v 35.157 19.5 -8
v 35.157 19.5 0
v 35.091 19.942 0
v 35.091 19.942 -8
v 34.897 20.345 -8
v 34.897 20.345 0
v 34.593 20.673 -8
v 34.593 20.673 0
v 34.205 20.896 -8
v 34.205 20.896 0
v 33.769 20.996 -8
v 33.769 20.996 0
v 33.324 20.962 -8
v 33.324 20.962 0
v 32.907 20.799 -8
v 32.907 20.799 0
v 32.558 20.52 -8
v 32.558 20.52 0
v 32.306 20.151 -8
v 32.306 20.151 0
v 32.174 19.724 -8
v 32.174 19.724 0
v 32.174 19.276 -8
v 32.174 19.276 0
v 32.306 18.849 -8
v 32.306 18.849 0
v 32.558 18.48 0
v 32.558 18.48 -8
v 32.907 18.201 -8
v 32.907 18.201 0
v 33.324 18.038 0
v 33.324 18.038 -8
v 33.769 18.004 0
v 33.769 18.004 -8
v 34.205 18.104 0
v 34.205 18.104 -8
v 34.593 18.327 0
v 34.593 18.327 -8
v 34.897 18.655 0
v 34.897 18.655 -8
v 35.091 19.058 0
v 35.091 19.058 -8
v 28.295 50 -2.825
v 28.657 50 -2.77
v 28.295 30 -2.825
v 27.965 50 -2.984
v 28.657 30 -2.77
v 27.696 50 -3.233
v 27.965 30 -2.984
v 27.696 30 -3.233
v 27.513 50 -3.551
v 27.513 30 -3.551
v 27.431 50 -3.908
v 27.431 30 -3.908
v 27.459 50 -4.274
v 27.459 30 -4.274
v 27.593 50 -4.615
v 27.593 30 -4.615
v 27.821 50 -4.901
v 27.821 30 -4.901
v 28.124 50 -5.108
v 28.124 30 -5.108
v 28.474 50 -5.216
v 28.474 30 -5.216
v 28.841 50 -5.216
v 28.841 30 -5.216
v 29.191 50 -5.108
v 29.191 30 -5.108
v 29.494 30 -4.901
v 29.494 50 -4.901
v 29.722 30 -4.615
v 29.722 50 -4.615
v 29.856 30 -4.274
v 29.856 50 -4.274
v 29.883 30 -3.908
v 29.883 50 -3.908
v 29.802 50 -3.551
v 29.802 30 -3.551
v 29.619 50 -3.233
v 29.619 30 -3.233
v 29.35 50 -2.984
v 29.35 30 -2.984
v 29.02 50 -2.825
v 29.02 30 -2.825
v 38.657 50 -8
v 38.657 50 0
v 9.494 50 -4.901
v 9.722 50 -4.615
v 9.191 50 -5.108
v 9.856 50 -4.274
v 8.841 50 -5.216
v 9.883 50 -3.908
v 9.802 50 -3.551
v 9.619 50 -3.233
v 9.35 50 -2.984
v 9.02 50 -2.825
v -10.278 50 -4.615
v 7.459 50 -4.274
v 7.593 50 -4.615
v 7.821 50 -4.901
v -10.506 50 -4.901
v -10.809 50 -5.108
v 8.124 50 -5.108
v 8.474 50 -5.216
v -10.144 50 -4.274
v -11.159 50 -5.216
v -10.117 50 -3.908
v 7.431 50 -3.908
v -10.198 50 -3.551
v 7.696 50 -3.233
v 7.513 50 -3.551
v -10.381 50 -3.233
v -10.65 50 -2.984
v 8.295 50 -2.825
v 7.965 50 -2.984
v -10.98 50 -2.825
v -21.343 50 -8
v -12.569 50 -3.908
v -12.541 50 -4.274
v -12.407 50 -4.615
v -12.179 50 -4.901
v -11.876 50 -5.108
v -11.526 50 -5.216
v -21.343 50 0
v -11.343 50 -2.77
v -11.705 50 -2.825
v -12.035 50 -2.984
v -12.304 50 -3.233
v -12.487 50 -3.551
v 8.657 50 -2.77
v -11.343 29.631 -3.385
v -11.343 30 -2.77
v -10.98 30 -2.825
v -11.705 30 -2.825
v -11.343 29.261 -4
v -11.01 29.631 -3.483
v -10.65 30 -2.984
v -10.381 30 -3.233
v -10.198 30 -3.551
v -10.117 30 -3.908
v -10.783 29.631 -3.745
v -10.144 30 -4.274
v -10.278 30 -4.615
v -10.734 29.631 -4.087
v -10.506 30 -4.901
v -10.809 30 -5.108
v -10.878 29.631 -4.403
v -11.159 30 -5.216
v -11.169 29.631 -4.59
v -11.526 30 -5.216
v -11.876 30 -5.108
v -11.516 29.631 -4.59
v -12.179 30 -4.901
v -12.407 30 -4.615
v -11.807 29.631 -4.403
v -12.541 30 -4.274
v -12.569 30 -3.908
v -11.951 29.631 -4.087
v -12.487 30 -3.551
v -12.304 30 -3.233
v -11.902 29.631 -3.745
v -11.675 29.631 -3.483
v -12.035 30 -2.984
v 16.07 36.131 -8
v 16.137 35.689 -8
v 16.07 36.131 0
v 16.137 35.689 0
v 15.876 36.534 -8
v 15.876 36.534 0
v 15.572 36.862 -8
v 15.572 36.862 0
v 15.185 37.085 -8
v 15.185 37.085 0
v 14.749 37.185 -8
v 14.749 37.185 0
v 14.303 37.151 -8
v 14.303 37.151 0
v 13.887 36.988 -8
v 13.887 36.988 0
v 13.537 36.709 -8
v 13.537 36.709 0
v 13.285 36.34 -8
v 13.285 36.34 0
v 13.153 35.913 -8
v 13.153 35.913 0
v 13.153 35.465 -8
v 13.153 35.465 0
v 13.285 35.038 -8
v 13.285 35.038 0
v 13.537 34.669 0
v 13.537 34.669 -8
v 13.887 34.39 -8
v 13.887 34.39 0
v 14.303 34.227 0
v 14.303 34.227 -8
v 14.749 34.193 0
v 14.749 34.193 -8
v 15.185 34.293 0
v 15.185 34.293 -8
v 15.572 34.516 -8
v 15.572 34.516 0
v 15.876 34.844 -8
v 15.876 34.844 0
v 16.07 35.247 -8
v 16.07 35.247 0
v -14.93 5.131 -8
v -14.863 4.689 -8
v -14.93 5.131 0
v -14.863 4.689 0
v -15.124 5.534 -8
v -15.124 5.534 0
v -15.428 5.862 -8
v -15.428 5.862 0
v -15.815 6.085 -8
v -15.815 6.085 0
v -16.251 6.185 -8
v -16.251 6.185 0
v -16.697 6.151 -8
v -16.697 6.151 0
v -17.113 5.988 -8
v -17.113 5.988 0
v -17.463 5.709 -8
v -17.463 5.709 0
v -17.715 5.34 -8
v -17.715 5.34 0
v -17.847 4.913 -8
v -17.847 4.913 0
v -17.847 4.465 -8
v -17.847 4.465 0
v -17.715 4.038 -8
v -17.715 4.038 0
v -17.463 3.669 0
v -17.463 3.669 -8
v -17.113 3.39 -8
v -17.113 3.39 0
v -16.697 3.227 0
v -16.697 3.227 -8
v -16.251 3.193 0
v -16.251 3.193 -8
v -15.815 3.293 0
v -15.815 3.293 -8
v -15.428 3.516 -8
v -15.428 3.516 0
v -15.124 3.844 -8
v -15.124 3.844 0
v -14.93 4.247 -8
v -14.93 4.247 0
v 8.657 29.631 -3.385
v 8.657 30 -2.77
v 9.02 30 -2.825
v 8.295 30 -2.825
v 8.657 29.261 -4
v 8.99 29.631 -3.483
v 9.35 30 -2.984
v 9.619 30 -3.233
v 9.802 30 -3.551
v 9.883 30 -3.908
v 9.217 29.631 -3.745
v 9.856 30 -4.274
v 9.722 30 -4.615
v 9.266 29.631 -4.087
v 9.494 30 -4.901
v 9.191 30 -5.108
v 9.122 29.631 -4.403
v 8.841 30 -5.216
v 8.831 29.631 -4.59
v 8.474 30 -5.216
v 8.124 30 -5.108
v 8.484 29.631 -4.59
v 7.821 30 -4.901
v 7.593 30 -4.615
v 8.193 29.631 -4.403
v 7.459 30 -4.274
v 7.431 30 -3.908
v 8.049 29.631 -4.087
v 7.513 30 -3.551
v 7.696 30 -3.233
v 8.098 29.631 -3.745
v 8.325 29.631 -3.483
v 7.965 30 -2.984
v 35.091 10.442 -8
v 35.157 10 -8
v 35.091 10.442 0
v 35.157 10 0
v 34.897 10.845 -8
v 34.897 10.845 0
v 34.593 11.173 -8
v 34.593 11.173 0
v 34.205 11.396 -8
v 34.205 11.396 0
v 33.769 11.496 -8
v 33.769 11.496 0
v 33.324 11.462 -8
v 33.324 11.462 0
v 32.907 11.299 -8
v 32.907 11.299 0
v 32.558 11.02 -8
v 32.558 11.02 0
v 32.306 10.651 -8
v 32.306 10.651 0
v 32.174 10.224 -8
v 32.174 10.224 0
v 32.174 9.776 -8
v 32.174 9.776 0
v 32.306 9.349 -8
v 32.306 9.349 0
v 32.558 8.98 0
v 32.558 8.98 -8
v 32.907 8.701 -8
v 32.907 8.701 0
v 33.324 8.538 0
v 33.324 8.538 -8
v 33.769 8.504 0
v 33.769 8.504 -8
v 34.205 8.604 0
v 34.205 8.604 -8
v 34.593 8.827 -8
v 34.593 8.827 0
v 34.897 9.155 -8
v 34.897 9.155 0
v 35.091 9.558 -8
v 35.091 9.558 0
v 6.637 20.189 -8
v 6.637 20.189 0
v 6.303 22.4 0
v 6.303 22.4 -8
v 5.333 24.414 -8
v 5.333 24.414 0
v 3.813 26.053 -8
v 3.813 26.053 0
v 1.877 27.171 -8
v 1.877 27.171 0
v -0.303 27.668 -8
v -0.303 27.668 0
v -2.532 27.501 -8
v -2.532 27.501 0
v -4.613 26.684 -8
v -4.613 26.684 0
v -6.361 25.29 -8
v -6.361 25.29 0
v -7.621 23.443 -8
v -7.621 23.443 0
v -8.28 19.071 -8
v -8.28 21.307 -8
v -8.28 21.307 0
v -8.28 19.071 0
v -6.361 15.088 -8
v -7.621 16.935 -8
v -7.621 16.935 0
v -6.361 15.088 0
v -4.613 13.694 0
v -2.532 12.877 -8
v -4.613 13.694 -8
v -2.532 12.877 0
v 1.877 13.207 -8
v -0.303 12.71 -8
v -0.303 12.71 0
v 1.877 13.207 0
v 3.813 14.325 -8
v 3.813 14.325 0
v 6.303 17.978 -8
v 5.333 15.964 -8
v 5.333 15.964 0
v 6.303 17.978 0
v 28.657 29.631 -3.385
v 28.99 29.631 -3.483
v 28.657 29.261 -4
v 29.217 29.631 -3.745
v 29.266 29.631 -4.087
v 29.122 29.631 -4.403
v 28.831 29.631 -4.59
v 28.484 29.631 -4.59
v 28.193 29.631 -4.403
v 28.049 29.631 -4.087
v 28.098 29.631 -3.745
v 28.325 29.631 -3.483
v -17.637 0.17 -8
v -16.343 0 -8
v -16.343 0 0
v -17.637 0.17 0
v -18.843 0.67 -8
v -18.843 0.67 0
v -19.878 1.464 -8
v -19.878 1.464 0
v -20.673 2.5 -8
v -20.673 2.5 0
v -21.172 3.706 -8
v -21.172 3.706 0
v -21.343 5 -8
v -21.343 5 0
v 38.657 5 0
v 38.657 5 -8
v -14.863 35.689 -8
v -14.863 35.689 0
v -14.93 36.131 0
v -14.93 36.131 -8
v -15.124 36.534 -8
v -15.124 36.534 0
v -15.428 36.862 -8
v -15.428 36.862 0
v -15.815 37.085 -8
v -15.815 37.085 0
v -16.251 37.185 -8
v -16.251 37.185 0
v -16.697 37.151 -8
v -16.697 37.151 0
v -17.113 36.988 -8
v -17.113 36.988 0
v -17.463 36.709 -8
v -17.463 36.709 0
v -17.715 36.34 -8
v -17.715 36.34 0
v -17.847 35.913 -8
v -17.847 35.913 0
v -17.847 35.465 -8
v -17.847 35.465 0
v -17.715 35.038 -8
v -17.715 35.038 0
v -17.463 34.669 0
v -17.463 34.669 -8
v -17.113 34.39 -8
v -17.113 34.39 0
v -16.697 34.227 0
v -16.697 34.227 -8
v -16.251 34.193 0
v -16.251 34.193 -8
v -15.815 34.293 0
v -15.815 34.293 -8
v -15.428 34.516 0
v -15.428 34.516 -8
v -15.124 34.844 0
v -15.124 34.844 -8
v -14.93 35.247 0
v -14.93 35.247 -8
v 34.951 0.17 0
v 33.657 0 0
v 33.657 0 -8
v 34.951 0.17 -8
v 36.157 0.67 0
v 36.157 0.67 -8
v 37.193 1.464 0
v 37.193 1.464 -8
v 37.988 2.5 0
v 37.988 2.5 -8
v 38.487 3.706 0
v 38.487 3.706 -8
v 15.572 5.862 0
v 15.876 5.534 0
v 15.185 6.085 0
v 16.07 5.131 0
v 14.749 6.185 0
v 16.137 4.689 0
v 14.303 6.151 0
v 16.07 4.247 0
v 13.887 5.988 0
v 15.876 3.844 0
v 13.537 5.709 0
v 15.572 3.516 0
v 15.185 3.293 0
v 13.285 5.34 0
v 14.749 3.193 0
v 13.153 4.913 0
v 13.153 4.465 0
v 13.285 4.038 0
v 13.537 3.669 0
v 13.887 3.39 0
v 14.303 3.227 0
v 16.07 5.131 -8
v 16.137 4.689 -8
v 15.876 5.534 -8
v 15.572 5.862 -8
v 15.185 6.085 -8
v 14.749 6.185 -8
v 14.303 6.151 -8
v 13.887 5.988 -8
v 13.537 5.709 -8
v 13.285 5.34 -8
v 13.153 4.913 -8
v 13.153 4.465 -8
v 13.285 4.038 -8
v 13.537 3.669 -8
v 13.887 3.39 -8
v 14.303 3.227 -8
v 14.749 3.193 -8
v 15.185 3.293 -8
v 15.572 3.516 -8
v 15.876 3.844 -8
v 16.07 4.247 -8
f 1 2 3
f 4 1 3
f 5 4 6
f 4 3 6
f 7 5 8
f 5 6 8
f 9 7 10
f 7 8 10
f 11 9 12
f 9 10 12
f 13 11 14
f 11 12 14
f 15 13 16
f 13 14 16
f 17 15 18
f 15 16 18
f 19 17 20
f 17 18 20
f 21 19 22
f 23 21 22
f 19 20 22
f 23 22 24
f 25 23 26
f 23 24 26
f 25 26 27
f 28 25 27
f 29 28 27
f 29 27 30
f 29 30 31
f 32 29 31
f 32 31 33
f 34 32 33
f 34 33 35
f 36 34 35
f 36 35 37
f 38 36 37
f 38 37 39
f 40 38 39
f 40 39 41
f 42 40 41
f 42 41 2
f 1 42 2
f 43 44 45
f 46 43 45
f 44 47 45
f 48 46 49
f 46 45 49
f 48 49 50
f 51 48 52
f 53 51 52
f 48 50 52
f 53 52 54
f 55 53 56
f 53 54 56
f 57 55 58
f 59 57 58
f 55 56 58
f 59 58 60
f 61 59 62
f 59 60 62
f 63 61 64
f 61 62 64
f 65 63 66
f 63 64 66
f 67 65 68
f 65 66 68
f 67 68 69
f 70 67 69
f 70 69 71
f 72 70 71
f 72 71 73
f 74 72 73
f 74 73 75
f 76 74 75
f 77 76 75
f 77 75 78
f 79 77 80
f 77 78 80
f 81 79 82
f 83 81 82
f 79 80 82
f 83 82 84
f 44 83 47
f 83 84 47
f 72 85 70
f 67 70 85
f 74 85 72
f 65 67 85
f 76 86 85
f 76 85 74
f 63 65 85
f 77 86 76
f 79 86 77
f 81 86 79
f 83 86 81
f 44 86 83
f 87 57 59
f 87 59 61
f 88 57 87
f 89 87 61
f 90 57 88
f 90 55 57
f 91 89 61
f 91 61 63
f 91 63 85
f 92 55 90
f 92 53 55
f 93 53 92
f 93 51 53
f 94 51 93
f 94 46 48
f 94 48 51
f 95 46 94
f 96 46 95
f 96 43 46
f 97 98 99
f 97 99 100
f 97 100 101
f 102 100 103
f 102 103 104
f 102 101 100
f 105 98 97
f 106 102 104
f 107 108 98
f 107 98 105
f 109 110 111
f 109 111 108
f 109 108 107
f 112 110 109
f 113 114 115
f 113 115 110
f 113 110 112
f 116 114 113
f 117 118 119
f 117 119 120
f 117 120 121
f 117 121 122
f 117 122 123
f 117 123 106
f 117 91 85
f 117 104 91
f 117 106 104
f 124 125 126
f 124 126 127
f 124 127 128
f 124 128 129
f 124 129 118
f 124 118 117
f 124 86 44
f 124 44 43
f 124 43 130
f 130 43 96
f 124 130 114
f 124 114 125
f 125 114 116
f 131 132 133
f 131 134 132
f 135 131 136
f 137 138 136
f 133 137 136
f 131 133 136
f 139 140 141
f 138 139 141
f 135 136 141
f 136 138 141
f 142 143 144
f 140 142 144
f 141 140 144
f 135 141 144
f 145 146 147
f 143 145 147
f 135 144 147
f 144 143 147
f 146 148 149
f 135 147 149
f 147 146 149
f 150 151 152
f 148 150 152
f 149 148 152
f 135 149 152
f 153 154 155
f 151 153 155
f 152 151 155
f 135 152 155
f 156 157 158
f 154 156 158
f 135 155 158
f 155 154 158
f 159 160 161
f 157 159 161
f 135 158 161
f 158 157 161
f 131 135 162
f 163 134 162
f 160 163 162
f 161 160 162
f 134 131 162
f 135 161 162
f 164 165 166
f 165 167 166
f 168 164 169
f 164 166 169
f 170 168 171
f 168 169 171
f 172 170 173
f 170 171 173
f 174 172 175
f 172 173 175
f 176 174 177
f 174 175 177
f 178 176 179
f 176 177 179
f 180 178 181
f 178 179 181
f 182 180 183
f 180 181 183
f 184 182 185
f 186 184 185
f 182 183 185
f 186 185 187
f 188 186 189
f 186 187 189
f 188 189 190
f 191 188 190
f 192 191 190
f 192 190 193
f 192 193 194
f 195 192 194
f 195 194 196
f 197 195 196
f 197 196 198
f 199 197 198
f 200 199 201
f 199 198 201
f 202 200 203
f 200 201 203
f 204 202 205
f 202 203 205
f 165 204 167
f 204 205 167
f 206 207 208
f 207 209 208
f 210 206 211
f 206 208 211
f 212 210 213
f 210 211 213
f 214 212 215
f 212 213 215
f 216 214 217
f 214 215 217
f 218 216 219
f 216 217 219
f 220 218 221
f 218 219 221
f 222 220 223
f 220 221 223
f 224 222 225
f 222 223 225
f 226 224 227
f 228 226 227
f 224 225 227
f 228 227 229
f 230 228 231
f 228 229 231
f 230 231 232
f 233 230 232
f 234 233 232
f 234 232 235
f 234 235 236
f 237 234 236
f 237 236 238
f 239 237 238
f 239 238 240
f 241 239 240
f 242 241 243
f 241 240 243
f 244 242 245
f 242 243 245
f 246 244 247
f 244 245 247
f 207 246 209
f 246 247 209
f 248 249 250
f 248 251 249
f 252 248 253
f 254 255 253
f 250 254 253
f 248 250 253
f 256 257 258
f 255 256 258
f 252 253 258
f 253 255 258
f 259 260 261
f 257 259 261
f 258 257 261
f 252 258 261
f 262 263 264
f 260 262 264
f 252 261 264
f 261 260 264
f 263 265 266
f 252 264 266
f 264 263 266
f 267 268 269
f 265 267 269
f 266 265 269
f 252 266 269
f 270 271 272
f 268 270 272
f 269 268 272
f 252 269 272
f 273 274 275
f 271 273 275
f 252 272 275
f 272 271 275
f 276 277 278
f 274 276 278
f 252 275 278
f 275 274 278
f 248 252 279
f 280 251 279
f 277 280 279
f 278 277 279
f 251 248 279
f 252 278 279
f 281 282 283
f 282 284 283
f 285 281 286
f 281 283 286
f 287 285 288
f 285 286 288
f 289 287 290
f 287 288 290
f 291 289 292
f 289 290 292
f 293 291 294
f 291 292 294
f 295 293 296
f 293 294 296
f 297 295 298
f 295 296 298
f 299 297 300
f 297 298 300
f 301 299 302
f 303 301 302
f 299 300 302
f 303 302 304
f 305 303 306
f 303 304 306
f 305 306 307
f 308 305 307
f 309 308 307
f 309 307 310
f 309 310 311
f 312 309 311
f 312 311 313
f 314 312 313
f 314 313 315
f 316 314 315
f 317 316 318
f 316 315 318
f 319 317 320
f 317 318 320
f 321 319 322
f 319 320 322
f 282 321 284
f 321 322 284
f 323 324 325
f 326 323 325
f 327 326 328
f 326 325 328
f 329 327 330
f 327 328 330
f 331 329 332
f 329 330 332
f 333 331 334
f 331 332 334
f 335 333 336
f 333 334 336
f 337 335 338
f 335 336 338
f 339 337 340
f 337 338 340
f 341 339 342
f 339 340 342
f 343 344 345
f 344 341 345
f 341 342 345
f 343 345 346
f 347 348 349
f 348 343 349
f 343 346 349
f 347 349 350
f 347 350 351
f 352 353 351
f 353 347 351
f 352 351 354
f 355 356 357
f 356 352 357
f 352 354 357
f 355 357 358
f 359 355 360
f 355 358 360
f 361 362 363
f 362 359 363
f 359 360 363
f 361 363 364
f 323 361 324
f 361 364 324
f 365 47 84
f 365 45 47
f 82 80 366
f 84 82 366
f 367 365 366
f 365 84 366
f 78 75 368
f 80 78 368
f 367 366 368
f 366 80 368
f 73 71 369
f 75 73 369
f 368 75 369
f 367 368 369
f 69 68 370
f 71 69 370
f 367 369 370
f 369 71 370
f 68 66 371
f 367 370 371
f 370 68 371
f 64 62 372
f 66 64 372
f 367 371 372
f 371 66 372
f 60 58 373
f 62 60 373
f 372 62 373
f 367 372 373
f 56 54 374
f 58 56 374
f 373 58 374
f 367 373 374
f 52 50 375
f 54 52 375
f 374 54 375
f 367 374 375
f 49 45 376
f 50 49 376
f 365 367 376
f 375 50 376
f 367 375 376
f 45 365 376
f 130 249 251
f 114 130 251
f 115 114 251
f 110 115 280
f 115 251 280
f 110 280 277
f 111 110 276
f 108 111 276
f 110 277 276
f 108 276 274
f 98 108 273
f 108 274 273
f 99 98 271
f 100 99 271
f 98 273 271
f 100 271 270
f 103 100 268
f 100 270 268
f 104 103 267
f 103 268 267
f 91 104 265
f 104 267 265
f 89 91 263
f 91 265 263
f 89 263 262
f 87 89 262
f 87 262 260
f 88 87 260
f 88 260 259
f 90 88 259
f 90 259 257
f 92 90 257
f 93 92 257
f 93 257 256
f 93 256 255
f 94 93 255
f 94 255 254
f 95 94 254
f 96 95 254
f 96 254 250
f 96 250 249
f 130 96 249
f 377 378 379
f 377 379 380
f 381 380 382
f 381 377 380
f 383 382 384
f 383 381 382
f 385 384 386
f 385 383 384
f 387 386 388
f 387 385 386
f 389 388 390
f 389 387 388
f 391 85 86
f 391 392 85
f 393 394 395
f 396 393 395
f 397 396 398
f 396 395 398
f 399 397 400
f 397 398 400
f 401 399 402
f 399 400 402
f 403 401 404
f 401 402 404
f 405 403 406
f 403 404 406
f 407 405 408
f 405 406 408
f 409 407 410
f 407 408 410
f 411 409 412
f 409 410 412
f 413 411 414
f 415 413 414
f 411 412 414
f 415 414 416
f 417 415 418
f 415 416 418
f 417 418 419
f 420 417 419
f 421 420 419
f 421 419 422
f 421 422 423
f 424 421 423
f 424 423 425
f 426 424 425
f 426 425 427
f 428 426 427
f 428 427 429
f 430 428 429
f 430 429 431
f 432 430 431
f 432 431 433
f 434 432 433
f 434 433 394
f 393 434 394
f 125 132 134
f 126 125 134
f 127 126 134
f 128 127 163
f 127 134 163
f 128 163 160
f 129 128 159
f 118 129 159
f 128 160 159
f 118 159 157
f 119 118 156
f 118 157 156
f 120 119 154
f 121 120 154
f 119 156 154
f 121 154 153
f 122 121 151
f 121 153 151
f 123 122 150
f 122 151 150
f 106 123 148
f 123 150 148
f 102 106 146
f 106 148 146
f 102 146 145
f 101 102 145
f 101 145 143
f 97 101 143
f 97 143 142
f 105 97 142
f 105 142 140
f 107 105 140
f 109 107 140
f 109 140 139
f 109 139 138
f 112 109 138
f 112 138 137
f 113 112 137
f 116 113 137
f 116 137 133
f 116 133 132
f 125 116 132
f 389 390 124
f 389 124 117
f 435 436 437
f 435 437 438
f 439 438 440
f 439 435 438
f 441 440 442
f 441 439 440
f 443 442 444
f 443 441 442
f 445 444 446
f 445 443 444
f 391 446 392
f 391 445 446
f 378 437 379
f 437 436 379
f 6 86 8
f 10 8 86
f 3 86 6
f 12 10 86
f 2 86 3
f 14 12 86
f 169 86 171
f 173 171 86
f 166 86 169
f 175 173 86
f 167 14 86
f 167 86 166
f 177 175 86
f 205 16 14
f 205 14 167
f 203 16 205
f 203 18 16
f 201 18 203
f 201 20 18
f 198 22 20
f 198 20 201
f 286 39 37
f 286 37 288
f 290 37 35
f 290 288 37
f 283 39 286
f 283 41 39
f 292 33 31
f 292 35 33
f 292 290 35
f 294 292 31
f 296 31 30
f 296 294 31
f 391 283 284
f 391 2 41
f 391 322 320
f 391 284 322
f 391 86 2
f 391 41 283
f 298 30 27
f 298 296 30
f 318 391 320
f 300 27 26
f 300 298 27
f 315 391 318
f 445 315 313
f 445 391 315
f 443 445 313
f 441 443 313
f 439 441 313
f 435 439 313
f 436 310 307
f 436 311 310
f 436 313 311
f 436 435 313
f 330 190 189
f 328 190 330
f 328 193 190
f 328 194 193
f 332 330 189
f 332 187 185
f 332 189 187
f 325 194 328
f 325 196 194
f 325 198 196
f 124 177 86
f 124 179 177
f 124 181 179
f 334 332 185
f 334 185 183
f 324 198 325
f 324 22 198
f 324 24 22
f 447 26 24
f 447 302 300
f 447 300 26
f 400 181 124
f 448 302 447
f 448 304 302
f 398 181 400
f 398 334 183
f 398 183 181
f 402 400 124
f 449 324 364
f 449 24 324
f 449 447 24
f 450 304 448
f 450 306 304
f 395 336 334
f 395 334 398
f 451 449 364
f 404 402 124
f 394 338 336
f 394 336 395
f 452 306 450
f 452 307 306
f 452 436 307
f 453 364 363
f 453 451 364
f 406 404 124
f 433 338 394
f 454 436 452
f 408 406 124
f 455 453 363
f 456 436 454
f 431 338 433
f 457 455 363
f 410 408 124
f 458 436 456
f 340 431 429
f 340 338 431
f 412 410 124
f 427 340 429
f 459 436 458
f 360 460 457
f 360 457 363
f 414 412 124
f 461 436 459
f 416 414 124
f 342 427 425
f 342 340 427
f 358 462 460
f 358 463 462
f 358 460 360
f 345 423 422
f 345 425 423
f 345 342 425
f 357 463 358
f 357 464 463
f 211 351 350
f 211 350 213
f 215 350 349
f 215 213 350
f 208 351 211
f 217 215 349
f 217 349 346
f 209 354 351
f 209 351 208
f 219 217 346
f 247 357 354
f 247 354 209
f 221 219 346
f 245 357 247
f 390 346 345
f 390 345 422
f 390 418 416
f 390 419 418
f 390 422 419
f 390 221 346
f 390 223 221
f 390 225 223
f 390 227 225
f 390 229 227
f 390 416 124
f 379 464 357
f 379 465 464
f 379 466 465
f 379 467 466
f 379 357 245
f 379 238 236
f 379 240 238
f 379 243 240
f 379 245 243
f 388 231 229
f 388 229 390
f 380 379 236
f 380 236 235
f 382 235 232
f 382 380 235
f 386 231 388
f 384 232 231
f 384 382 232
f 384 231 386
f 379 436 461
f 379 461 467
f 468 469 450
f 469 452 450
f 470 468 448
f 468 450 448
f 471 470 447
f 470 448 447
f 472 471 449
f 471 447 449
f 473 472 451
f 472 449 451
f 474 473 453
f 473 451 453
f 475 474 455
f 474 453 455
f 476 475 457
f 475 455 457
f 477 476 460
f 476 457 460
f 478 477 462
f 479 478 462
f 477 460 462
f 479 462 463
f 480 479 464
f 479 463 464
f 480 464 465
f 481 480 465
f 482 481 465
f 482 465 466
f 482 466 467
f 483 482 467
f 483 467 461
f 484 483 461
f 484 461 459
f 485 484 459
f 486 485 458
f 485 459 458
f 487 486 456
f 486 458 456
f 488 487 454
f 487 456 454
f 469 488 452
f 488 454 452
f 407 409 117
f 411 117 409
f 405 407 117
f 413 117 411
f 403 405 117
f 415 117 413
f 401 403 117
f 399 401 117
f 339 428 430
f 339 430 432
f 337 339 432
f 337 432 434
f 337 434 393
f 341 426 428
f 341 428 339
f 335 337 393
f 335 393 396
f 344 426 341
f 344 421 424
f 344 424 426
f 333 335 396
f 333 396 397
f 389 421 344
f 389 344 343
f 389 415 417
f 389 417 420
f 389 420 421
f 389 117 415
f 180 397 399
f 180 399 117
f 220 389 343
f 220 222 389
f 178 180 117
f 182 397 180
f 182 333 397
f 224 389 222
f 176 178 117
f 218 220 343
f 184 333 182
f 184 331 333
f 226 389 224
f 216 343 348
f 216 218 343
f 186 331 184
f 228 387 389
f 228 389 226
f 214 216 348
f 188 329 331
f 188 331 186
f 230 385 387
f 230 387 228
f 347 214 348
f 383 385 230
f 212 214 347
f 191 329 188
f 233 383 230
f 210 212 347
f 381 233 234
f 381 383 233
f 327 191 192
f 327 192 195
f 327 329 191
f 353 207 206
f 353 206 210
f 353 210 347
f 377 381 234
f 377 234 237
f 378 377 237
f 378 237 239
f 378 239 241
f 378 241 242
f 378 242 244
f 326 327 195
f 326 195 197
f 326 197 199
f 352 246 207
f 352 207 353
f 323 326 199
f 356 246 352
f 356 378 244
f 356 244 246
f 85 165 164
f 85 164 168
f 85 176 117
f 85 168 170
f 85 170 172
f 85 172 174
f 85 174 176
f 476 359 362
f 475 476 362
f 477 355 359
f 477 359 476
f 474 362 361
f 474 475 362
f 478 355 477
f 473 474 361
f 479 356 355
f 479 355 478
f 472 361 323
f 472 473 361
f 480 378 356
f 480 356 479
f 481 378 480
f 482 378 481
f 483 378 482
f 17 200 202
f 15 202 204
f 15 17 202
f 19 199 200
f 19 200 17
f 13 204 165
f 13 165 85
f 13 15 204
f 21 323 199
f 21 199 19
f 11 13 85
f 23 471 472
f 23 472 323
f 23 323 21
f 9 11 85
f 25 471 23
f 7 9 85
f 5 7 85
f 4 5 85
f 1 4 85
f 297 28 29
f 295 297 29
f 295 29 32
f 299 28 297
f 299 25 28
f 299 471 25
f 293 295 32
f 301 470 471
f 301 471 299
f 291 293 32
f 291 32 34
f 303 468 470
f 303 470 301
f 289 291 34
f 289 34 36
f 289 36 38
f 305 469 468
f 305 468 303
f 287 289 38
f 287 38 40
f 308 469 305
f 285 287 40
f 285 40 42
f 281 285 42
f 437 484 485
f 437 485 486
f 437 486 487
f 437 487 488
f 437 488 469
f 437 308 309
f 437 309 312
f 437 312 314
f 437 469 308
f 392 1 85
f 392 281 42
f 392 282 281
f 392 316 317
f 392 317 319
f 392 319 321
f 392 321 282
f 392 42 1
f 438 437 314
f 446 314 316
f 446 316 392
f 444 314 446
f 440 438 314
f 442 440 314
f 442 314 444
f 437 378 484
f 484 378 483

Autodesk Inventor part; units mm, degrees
ref_plane "YZ Plane" through (0, 0, 0) normal (1, 0, 0) x (0, 1, 0)
ref_plane "XZ Plane" through (0, 0, 0) normal (0, 1, 0) x (-1, 0, 0)
ref_plane "XY Plane" through (0, 0, 0) normal (0, 0, 1) x (1, 0, 0)
sketch "Sketch1" plane through (0, 0, 0) normal (0, 1, 0) x (-1, 0, 0)
  line L0 (0, 0) -> (21.3426, 0)
  line L1 (21.3426, 0) -> (21.3426, -8)
  line L2 (21.3426, -8) -> (0, -8)
  line L3 (0, -8) -> (-38.6574, -8)
  line L4 (-38.6574, -8) -> (-38.6574, 0)
  line L5 (-38.6574, 0) -> (0, 0)
  dimension "d2" = 8
  dimension "d3" = 60
  dimension "d13" = 8
extrude "Extrusion1" add sketch "Sketch1" along normal blind 50
sketch "Sketch3" plane through (0, 0, 0) normal (0, 0, 1) x (1, 0, 0)
  circle A0 centre (-0.8634, 20.189) radius 7.5 projected
  line L0 (-17.3634, -0.311) -> (-21.3634, 3.689) projected
  line L1 (-17.3634, -0.311) -> (15.6366, -0.311) projected
  line L2 (19.6366, 3.689) -> (15.6366, -0.311) projected
  line L3 (19.6366, 3.689) -> (19.6366, 36.689) projected
  line L4 (15.6366, 40.689) -> (19.6366, 36.689) projected
  line L5 (15.6366, 40.689) -> (-17.3634, 40.689) projected
  line L6 (-21.3634, 36.689) -> (-17.3634, 40.689) projected
  line L7 (-21.3634, 36.689) -> (-21.3634, 3.689) projected
  circle A1 centre (-16.3634, 35.689) radius 1.5 projected
  circle A2 centre (14.6366, 4.689) radius 1.5 projected
  circle A3 centre (14.6366, 35.689) radius 1.5 projected
  circle A4 centre (-16.3634, 4.689) radius 1.5 projected
  circle A5 centre (33.6574, 10) radius 1.5
  circle A6 centre (33.6574, 19.5) radius 1.5
  line L8 (38.6574, 0) -> (38.6574, 50) projected
  line L9 (-21.3426, 0) -> (38.6574, 0) projected
  point P0 (0, 0)
  dimension "d6" = 5
  dimension "d7" = 5
  dimension "d8" = 3
  dimension "d9" = 3
  dimension "d11" = 9.5
  dimension "d12" = 10
extrude "Extrusion2" cut sketch "Sketch3" against normal blind 10 contours A0 | A1 | A2 | A3 | A4 | A5 | A6
fillet "Fillet1" radius 5 2 edges at (38.6574, 0, -4) (-21.3426, 0, -4)
sketch "Sketch4" plane through (0, 50, 0) normal (0, 1, 0) x (1, 0, 0)
  circle A0 centre (-11.3426, 2.5) radius 1.5 projected
  circle A1 centre (8.6574, 2.5) radius 1.5 projected
  circle A2 centre (28.6574, 2.5) radius 1.5 projected
  circle A3 centre (-11.3426, 4) radius 1.5
  circle A4 centre (8.6574, 4) radius 1.5
  circle A5 centre (28.6574, 4) radius 1.5
  line L0 (-25.013, 4) -> (50.4038, 4)
  line L1 (-21.3426, 8) -> (-21.3426, 0) projected
  line L2 (-21.3426, 0) -> (38.6574, 0) projected
  point P0 (0, 0)
  dimension "d21" = 3
  dimension "d22" = 10
  dimension "d23" = 20
  dimension "d24" = 20
  dimension "d25" = 4
  dimension "d26" = 3
  dimension "d27" = 3
hole "Hole1" at (-11.3426, 50, -4) at (8.6574, 50, -4) at (28.6574, 50, -4) direction (0, -1, 0) diameter 2.459 depth 20 tip angle 118 thread size "M3x0.5" class "6H" standard "ISO Metric profile"
properties part number "X-Axis_motor_plate"
